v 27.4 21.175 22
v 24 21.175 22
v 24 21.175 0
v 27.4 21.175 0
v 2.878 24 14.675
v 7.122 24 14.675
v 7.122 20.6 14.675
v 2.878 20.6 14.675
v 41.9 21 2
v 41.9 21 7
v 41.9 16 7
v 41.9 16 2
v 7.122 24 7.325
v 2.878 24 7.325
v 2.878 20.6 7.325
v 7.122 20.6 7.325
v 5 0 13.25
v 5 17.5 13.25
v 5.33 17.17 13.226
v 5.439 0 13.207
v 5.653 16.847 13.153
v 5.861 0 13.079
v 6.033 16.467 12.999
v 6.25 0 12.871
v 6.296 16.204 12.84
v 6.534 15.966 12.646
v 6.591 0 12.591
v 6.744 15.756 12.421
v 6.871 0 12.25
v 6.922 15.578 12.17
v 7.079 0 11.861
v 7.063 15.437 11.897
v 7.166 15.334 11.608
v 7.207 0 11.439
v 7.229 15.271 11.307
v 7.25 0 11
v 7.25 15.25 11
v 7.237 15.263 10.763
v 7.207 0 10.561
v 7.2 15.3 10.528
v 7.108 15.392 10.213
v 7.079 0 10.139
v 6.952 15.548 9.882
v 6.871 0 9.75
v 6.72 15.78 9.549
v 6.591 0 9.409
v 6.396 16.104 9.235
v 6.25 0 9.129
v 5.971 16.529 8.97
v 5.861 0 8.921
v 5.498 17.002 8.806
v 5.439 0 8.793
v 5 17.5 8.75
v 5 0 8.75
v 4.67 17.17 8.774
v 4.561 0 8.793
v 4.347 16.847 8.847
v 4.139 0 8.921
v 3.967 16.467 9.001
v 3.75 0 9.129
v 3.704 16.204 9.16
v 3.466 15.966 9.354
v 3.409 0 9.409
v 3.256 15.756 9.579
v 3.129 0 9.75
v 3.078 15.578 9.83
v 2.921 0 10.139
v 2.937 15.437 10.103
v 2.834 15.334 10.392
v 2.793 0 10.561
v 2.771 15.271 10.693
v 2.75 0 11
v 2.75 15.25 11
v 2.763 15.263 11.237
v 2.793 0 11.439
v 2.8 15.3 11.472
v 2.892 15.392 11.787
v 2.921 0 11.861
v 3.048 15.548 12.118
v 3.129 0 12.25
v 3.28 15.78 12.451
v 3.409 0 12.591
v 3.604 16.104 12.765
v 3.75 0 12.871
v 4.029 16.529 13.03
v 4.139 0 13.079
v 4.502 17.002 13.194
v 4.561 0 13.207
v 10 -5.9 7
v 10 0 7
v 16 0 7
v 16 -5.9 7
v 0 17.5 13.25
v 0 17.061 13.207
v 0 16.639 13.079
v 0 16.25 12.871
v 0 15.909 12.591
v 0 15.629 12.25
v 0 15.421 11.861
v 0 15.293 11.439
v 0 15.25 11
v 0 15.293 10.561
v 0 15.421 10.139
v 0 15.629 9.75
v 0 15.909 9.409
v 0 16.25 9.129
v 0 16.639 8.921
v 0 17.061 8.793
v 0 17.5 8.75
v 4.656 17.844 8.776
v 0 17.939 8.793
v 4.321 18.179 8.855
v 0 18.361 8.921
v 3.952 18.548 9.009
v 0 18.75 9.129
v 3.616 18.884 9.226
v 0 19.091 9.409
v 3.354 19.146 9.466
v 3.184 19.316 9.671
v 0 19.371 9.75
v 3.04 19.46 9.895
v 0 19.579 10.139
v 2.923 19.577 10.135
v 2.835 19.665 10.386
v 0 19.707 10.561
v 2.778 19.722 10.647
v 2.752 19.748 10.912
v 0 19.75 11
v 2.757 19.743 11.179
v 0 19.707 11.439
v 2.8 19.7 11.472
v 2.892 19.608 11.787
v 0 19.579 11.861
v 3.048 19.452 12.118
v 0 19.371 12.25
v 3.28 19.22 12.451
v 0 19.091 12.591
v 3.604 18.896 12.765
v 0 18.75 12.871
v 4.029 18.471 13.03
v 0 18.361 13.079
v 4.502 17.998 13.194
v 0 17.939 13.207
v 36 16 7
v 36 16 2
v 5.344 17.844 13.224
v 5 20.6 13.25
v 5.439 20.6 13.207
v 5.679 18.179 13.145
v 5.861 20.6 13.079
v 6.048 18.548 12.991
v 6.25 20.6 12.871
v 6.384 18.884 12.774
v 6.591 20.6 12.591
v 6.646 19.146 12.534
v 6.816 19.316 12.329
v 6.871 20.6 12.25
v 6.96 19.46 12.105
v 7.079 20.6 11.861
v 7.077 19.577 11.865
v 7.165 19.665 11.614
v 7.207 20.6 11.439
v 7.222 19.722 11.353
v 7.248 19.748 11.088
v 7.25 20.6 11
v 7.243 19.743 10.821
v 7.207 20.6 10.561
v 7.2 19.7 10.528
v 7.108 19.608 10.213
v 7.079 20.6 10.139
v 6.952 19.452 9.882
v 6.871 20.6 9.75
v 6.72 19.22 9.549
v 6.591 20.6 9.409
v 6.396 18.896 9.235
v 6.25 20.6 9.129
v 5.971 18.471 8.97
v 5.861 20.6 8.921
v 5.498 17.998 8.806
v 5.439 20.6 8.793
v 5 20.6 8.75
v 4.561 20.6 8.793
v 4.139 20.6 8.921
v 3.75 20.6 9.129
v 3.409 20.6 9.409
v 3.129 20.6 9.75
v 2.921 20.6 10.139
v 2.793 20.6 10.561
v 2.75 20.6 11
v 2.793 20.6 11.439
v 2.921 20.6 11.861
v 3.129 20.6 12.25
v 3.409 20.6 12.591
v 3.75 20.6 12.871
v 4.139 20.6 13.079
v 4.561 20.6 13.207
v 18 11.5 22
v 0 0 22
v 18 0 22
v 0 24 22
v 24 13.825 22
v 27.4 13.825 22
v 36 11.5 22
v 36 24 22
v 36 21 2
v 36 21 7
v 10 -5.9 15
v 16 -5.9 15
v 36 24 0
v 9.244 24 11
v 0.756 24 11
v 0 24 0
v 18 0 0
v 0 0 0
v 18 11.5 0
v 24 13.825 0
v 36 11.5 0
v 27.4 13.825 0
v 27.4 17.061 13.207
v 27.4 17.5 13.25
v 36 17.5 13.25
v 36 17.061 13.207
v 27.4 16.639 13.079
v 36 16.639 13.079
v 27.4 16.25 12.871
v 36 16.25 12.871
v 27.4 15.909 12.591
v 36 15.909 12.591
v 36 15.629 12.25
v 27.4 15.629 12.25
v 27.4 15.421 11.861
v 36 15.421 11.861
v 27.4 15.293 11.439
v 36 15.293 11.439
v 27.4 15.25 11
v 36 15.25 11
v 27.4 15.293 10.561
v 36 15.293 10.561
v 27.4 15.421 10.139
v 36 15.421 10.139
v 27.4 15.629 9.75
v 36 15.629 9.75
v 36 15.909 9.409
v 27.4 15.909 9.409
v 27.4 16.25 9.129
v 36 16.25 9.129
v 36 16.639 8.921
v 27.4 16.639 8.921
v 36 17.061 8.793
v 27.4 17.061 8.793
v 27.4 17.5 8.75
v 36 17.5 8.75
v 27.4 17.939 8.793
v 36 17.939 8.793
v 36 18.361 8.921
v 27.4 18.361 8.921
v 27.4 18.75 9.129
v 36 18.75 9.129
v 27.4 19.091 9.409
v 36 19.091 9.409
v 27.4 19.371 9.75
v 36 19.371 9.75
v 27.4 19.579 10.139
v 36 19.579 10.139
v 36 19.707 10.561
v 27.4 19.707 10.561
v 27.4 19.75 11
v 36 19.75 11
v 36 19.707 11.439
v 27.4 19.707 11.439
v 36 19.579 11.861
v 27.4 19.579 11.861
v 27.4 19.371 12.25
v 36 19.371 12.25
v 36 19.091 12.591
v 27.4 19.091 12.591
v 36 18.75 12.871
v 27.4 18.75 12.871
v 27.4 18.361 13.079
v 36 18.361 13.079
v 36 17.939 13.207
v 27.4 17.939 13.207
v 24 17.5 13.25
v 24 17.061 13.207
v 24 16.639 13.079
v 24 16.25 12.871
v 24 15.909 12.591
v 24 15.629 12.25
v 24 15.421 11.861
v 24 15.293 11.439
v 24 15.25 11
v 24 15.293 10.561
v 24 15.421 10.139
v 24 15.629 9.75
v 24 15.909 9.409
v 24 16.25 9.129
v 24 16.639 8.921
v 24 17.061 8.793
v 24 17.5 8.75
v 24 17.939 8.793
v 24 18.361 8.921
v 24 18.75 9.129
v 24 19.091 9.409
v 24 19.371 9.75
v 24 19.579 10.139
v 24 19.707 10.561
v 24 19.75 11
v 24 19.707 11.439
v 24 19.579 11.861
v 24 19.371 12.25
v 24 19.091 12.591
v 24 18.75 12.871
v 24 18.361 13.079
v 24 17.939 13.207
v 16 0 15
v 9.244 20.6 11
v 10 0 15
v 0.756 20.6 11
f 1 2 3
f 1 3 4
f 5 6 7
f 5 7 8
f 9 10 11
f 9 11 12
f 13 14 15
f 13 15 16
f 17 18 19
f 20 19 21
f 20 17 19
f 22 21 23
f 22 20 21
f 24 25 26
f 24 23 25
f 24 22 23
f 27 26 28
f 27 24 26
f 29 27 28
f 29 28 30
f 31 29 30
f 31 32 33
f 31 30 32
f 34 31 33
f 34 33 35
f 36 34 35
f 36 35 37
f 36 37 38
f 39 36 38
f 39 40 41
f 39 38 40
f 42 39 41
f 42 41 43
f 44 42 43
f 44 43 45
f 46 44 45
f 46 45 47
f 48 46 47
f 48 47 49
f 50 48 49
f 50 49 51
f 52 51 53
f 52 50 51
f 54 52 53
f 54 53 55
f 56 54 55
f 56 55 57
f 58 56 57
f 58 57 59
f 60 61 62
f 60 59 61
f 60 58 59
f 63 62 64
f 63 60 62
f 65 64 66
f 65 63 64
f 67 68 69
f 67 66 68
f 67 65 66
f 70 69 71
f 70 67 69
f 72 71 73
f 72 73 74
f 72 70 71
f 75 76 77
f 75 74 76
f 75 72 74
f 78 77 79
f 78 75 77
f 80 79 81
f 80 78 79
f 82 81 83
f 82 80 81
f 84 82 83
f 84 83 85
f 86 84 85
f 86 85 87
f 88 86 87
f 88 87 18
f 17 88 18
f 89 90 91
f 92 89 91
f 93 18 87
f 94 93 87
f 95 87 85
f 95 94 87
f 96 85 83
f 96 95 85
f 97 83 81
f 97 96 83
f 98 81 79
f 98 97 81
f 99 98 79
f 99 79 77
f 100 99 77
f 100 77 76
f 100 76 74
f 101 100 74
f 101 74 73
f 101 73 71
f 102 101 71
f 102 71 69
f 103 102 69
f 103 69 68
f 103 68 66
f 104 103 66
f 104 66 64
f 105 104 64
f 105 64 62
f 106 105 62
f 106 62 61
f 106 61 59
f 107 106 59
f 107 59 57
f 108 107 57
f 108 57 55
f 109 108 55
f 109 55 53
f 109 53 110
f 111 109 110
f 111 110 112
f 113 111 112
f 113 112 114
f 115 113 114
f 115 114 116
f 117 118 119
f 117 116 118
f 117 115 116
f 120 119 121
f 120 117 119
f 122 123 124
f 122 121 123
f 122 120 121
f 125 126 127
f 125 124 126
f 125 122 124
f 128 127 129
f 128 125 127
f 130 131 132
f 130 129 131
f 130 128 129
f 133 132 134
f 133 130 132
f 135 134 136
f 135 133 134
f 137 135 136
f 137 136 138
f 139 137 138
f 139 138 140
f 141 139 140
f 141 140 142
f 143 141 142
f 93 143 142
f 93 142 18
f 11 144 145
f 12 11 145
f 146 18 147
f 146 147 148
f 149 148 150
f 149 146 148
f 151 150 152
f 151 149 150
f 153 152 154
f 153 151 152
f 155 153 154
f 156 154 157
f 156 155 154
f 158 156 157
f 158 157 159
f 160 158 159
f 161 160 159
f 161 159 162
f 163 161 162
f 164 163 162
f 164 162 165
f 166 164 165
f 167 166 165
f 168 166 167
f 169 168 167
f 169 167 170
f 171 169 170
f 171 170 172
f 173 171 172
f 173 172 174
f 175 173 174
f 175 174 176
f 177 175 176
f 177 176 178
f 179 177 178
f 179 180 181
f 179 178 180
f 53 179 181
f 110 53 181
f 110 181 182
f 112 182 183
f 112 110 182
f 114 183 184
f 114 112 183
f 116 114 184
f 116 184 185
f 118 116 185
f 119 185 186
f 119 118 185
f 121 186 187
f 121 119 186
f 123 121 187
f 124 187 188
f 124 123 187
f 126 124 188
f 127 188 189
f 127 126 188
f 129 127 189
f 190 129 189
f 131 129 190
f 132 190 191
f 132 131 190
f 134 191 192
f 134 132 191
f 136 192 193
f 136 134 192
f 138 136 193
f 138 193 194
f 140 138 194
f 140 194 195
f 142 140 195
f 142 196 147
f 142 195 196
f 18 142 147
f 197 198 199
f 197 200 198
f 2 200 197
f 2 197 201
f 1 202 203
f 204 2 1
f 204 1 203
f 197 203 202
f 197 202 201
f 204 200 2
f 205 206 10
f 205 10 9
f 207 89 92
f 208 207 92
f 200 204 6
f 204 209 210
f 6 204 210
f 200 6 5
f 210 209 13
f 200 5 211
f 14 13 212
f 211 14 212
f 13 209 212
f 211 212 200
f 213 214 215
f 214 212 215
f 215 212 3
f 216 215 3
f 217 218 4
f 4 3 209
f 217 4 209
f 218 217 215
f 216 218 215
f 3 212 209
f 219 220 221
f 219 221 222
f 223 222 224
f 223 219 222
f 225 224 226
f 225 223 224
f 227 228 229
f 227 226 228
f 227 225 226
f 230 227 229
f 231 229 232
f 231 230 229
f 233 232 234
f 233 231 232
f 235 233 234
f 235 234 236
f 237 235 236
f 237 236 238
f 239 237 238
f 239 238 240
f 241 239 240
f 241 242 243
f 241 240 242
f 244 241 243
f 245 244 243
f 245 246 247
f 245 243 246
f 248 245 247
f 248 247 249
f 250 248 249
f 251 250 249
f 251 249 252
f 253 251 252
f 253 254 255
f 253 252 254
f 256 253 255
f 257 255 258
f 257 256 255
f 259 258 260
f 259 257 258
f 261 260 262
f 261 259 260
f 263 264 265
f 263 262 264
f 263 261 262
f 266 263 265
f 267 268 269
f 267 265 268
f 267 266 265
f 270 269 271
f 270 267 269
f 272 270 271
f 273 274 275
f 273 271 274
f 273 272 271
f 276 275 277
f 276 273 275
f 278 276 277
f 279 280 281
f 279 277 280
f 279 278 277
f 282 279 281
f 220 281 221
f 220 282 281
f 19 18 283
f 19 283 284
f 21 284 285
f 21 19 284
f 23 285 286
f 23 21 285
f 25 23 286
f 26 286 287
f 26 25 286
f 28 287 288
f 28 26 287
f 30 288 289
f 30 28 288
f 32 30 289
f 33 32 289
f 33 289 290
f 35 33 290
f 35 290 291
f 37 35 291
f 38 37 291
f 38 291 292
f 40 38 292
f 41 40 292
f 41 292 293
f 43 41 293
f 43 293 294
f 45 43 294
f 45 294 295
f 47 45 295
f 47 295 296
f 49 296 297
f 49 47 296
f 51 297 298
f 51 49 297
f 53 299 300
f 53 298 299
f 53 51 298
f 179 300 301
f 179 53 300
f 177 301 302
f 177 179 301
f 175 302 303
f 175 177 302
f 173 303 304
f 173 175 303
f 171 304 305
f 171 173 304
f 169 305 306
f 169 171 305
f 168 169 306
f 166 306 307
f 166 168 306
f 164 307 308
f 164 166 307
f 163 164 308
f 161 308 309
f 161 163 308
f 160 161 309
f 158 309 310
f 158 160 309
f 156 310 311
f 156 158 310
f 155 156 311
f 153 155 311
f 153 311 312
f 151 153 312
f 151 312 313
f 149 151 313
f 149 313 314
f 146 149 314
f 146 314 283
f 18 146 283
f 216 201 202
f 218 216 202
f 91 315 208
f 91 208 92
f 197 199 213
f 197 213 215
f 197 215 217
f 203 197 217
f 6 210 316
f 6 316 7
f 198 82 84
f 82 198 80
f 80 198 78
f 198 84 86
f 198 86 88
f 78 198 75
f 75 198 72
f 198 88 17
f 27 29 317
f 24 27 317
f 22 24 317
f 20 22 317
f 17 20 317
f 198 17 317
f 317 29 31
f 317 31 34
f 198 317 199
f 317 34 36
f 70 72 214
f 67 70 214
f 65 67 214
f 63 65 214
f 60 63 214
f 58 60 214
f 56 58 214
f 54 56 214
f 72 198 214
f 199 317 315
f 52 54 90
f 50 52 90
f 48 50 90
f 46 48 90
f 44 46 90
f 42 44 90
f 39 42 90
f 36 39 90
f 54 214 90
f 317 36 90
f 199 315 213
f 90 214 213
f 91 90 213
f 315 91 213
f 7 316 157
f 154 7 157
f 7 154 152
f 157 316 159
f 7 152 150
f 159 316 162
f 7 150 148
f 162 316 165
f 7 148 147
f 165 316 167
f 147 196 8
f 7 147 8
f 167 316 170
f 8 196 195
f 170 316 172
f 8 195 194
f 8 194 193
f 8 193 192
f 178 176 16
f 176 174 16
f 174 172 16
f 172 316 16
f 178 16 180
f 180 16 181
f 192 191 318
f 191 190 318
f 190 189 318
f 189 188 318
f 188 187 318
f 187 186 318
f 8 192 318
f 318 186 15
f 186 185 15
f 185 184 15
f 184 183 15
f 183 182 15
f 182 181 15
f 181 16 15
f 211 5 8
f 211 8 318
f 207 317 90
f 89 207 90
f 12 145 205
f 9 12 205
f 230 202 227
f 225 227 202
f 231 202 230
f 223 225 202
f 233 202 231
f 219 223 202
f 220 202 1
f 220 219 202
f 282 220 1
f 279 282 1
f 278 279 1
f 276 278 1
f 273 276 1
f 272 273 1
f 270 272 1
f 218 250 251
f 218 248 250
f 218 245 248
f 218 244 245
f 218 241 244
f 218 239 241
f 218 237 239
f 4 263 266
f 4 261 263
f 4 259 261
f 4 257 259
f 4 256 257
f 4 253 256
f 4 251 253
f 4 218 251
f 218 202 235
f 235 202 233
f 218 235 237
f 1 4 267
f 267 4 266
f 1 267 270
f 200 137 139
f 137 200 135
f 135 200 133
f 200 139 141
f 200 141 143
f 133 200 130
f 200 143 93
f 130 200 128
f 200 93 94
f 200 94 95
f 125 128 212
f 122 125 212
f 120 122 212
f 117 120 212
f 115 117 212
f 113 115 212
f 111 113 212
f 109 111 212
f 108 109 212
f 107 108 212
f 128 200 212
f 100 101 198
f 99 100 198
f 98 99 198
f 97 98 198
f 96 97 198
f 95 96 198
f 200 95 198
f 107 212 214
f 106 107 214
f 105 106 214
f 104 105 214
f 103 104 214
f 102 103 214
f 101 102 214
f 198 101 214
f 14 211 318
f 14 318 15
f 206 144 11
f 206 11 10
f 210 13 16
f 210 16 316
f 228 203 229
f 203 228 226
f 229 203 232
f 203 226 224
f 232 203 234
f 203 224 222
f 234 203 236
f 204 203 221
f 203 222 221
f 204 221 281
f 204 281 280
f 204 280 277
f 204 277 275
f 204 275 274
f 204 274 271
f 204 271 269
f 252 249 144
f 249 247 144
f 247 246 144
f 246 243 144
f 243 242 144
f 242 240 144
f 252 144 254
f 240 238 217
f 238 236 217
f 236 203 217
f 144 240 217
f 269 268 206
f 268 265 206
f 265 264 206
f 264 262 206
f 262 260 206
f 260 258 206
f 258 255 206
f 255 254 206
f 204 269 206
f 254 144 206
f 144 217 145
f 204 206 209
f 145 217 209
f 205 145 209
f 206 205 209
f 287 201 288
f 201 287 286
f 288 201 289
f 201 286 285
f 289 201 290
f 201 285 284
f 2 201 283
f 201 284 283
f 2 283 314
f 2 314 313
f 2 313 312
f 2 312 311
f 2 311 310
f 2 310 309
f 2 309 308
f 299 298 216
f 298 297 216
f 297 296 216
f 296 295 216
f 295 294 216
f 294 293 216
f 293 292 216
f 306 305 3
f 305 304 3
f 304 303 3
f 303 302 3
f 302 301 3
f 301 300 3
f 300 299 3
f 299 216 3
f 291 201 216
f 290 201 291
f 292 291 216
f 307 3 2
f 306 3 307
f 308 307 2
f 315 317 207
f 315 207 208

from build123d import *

# Parameters (mm, degrees)
EXTRUDE_420_DEPTH          = 22
SKETCH_473_W               = 6
SKETCH_473_H               = 8
EXTRUDE_540_DEPTH          = 5.9
SKETCH_591_W               = 5
SKETCH_591_H               = 5
EXTRUDE_711_DEPTH          = 5.9
CUT_EXTRUDE_4_DEPTH        = 54.062321849
CUT_EXTRUDE_4_DEPTH_BACK   = 54.062321849
SKETCH_4_R                 = 2.25
CUT_EXTRUDE_4_2_DEPTH      = 49.538644398
CUT_EXTRUDE_4_2_DEPTH_BACK = 49.538644398
SKETCH_4_2_R               = 2.25
CUT_EXTRUDE_4_3_DEPTH      = 3.4
CUT_EXTRUDE_4_4_DEPTH      = 54.062321849
CUT_EXTRUDE_4_4_DEPTH_BACK = 54.062321849
SKETCH_4_4_W               = 3.4
SKETCH_4_4_H               = 7.35


with BuildPart() as part:
    # Sketch 413 → Extrude 420 (new body)
    with BuildSketch(Plane.XY):
        Polygon((0, 0), (18, 0), (18, 11.5), (36, 11.5), (36, 24), (0, 24), align=None)
    extrude(amount=EXTRUDE_420_DEPTH)

    # Sketch 473 → Extrude 540 (add)
    with BuildSketch(Plane(origin=(0, 0, 0), x_dir=(1, 0, 0), z_dir=(0, 1, 0))):
        with Locations((13, -11)):
            Rectangle(SKETCH_473_W, SKETCH_473_H)
    extrude(amount=-EXTRUDE_540_DEPTH)

    # Sketch 591 → Extrude 711 (add)
    with BuildSketch(Plane(origin=(36, 0, 0), x_dir=(0, 0, -1), z_dir=(1, 0, 0))):
        with Locations((-4.5, 18.5)):
            Rectangle(SKETCH_591_W, SKETCH_591_H)
    extrude(amount=EXTRUDE_711_DEPTH)

    # Sketch 4 → Cut-Extrude 4 (cut, two sides: drawn at the far end of the back side and taken through both)
    with BuildSketch(Plane(origin=(0, 0, 0), x_dir=(1, 0, 0), z_dir=(0, 1, 0)).offset(-CUT_EXTRUDE_4_DEPTH_BACK)):
        with Locations(Location((5, -11, 0), (0, 0, 270))):
            Circle(SKETCH_4_R)
    extrude(amount=CUT_EXTRUDE_4_DEPTH + CUT_EXTRUDE_4_DEPTH_BACK, mode=Mode.SUBTRACT)

    # Sketch 4 2 → Cut-Extrude 4 2 (cut, two sides: drawn at the far end of the back side and taken through both)
    with BuildSketch(Plane(origin=(36, 0, 0), x_dir=(0, 0, -1), z_dir=(1, 0, 0)).offset(-CUT_EXTRUDE_4_2_DEPTH_BACK)):
        with Locations(Location((-11, 17.5, 0), (0, 0, 180))):
            Circle(SKETCH_4_2_R)
    extrude(amount=CUT_EXTRUDE_4_2_DEPTH + CUT_EXTRUDE_4_2_DEPTH_BACK, mode=Mode.SUBTRACT)

    # Sketch 4 3 → Cut-Extrude 4 3 (cut)
    with BuildSketch(Plane(origin=(0, 24, 0), x_dir=(1, 0, 0), z_dir=(0, 1, 0))):
        Polygon((9.243524479, -11), (7.121762239, -14.675), (2.878237761, -14.675), (0.756475521, -11), (2.878237761, -7.325), (7.121762239, -7.325), align=None)
    extrude(amount=-CUT_EXTRUDE_4_3_DEPTH, mode=Mode.SUBTRACT)

    # Sketch 4 4 → Cut-Extrude 4 4 (cut, two sides: drawn at the far end of the back side and taken through both)
    with BuildSketch(Plane.XY.offset(-CUT_EXTRUDE_4_4_DEPTH_BACK)):
        with Locations((25.7, 17.5)):
            Rectangle(SKETCH_4_4_W, SKETCH_4_4_H)
    extrude(amount=CUT_EXTRUDE_4_4_DEPTH + CUT_EXTRUDE_4_4_DEPTH_BACK, mode=Mode.SUBTRACT)


solid = part.part
